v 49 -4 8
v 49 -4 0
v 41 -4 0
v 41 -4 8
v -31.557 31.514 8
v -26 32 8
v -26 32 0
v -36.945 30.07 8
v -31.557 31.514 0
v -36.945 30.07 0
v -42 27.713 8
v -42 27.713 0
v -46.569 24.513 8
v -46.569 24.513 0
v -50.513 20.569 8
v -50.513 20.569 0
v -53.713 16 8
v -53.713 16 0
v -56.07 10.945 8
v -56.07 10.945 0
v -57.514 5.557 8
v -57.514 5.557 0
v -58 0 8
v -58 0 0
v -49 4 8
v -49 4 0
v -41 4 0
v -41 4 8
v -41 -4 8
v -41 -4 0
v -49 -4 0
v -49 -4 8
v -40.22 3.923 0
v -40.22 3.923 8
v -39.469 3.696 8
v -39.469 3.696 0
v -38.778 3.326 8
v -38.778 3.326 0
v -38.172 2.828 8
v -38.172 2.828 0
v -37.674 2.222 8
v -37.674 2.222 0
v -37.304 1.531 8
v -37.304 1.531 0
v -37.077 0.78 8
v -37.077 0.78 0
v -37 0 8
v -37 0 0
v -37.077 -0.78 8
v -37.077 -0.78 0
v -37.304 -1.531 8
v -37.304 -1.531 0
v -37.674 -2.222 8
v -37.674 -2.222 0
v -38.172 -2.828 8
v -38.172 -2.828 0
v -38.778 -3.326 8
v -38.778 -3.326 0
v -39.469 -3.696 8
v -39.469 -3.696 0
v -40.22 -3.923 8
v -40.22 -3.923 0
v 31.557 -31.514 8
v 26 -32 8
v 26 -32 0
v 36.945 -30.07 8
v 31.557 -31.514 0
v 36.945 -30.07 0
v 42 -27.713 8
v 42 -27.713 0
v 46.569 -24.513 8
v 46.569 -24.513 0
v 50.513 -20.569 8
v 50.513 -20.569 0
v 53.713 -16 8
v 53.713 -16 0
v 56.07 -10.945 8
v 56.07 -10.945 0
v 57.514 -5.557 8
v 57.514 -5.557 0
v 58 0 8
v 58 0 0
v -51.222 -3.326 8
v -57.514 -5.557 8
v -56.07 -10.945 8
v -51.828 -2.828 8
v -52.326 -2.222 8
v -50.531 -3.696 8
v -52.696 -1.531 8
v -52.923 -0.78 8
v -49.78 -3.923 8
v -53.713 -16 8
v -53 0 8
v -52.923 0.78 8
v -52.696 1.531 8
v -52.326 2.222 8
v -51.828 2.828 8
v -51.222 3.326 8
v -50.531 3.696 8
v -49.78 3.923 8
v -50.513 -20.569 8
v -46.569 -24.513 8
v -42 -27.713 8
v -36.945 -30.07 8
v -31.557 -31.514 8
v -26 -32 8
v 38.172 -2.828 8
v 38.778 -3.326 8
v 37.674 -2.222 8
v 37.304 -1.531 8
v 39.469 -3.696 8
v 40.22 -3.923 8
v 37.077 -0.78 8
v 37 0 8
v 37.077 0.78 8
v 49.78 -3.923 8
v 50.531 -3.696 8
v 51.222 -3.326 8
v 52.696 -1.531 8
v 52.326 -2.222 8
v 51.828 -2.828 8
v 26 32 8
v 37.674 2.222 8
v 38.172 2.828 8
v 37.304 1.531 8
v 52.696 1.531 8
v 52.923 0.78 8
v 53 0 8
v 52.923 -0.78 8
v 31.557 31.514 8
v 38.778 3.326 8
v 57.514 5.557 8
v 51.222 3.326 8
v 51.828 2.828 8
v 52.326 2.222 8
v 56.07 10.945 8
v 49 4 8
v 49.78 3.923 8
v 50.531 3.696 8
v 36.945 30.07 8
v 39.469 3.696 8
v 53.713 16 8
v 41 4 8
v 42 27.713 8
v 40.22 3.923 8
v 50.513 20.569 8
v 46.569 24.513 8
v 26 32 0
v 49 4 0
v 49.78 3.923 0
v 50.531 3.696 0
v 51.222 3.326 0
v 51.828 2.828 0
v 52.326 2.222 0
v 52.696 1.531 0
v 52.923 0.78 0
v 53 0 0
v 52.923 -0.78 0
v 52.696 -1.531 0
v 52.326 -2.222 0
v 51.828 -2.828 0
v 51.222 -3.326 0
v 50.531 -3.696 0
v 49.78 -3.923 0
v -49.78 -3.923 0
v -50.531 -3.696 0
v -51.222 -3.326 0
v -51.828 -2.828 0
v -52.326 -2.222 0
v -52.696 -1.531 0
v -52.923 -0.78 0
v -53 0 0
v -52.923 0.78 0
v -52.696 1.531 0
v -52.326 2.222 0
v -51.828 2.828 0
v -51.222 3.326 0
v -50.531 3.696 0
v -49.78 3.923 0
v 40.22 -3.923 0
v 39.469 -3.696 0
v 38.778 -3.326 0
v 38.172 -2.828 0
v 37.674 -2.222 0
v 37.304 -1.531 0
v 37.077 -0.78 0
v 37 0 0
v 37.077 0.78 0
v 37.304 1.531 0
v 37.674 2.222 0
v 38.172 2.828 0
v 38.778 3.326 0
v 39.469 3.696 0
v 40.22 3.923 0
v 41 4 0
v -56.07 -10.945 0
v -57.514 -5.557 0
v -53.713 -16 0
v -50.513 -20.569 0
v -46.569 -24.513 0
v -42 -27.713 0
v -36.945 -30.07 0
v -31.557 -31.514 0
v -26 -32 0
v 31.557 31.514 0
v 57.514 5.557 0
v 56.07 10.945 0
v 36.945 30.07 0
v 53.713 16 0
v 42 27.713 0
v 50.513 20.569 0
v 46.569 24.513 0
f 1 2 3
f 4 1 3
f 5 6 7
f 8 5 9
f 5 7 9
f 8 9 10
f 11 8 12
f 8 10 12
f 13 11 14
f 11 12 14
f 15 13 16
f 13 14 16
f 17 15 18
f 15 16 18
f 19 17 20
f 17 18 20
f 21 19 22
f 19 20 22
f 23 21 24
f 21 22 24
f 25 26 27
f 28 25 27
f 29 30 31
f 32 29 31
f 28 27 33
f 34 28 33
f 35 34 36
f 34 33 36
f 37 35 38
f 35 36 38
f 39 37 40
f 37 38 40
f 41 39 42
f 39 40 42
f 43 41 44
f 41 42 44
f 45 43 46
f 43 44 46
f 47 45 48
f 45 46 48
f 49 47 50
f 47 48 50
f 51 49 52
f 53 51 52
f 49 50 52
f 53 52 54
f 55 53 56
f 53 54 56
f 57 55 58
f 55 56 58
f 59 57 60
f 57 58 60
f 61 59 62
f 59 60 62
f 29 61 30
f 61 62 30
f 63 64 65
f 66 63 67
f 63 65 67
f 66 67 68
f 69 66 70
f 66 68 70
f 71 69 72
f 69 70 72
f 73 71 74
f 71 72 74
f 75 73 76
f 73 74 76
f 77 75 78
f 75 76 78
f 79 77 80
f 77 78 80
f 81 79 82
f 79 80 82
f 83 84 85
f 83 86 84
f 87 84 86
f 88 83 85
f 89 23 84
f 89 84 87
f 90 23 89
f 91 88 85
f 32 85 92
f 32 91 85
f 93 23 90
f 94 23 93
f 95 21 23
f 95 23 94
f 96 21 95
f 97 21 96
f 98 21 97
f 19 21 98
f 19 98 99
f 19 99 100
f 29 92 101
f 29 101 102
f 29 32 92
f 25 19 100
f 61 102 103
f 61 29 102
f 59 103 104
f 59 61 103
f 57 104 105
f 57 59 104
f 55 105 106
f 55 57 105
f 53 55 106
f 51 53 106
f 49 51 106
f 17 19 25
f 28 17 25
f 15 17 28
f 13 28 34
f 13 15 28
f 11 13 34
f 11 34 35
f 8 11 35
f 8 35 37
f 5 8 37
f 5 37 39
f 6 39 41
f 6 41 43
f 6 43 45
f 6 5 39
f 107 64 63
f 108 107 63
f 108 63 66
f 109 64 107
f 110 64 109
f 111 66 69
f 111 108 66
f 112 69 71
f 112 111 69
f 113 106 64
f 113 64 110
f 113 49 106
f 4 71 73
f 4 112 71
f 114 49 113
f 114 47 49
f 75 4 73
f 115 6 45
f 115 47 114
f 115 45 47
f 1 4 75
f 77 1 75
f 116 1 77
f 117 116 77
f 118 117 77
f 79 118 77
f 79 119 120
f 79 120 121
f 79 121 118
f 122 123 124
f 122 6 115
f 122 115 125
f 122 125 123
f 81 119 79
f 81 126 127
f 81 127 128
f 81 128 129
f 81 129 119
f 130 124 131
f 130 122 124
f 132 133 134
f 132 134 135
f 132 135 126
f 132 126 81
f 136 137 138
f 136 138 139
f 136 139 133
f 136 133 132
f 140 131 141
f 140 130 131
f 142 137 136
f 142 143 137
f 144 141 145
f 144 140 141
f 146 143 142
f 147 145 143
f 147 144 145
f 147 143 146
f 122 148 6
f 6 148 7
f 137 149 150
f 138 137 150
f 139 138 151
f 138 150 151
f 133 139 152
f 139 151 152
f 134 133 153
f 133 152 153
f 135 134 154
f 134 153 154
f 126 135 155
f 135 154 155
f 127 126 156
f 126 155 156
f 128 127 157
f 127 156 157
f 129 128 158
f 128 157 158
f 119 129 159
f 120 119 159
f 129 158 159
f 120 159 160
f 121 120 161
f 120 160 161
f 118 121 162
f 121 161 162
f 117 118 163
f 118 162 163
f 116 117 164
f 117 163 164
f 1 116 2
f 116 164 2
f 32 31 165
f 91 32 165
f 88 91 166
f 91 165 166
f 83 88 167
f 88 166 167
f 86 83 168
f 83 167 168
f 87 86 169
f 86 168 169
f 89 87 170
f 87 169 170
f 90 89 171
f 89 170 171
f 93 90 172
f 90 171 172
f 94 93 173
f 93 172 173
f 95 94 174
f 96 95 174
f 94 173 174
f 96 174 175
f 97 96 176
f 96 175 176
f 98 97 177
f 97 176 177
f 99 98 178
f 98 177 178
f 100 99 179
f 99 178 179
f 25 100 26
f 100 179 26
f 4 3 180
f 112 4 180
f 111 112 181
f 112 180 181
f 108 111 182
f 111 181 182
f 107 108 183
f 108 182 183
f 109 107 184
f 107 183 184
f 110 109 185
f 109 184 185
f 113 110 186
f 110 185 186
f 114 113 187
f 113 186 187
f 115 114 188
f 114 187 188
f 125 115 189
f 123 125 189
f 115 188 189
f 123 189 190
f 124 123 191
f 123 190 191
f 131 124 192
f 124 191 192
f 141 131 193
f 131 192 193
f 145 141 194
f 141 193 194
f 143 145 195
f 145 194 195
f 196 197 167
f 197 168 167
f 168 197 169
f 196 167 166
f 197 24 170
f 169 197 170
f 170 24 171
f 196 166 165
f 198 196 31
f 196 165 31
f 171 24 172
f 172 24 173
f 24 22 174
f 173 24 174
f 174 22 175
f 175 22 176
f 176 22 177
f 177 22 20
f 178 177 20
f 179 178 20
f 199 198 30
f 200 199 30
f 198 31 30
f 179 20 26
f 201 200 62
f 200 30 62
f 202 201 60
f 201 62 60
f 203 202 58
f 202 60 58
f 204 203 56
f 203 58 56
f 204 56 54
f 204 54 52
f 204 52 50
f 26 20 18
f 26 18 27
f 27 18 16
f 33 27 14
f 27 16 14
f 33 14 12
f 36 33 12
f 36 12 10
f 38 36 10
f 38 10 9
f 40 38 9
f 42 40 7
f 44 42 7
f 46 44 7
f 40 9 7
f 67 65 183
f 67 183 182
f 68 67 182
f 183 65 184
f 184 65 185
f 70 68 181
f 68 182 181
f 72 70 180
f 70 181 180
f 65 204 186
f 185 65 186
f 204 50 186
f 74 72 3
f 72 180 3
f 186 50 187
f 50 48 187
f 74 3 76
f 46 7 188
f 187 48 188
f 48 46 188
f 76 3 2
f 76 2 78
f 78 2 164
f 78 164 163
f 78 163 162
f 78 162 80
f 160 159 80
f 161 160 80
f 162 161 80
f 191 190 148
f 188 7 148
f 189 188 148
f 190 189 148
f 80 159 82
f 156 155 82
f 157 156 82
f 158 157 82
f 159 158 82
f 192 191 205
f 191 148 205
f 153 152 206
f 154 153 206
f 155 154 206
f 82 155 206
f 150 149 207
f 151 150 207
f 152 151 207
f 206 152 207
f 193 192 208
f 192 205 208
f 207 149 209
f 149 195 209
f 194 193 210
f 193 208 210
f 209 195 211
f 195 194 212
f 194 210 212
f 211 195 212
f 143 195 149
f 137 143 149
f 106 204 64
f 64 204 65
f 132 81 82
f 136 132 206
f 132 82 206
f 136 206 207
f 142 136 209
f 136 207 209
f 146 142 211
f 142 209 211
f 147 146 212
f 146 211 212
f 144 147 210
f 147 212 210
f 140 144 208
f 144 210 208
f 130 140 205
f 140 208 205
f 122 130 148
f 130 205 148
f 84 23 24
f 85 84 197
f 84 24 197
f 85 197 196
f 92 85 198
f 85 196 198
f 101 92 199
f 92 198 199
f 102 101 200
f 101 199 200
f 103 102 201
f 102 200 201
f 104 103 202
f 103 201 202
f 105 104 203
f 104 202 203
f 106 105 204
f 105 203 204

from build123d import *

# Parameters (mm, degrees)
F1_DEPTH = 8


with BuildPart() as f1:
    # F0 (on Top) → F1 (new body)
    with BuildSketch(Plane.XY):
        with BuildLine():
            Line((26, 32), (-26, 32))
            ThreePointArc((-26, 32), (-48.627417, 22.627417), (-58, 0))
            ThreePointArc((-58, 0), (-48.627417, -22.627417), (-26, -32))
            Line((-26, -32), (26, -32))
            ThreePointArc((26, -32), (48.627417, -22.627417), (58, 0))
            ThreePointArc((58, 0), (48.627417, 22.627417), (26, 32))
        make_face()
        with BuildLine():
            ThreePointArc((-49, -4), (-53, 0), (-49, 4))
            Line((-49, 4), (-41, 4))
            ThreePointArc((-41, 4), (-37, 0), (-41, -4))
            Line((-41, -4), (-49, -4))
        make_face(mode=Mode.SUBTRACT)
        with BuildLine():
            Line((49, -4), (41, -4))
            ThreePointArc((41, -4), (37, 0), (41, 4))
            Line((41, 4), (49, 4))
            ThreePointArc((49, 4), (53, 0), (49, -4))
        make_face(mode=Mode.SUBTRACT)
    extrude(amount=F1_DEPTH)


solid = f1.part
